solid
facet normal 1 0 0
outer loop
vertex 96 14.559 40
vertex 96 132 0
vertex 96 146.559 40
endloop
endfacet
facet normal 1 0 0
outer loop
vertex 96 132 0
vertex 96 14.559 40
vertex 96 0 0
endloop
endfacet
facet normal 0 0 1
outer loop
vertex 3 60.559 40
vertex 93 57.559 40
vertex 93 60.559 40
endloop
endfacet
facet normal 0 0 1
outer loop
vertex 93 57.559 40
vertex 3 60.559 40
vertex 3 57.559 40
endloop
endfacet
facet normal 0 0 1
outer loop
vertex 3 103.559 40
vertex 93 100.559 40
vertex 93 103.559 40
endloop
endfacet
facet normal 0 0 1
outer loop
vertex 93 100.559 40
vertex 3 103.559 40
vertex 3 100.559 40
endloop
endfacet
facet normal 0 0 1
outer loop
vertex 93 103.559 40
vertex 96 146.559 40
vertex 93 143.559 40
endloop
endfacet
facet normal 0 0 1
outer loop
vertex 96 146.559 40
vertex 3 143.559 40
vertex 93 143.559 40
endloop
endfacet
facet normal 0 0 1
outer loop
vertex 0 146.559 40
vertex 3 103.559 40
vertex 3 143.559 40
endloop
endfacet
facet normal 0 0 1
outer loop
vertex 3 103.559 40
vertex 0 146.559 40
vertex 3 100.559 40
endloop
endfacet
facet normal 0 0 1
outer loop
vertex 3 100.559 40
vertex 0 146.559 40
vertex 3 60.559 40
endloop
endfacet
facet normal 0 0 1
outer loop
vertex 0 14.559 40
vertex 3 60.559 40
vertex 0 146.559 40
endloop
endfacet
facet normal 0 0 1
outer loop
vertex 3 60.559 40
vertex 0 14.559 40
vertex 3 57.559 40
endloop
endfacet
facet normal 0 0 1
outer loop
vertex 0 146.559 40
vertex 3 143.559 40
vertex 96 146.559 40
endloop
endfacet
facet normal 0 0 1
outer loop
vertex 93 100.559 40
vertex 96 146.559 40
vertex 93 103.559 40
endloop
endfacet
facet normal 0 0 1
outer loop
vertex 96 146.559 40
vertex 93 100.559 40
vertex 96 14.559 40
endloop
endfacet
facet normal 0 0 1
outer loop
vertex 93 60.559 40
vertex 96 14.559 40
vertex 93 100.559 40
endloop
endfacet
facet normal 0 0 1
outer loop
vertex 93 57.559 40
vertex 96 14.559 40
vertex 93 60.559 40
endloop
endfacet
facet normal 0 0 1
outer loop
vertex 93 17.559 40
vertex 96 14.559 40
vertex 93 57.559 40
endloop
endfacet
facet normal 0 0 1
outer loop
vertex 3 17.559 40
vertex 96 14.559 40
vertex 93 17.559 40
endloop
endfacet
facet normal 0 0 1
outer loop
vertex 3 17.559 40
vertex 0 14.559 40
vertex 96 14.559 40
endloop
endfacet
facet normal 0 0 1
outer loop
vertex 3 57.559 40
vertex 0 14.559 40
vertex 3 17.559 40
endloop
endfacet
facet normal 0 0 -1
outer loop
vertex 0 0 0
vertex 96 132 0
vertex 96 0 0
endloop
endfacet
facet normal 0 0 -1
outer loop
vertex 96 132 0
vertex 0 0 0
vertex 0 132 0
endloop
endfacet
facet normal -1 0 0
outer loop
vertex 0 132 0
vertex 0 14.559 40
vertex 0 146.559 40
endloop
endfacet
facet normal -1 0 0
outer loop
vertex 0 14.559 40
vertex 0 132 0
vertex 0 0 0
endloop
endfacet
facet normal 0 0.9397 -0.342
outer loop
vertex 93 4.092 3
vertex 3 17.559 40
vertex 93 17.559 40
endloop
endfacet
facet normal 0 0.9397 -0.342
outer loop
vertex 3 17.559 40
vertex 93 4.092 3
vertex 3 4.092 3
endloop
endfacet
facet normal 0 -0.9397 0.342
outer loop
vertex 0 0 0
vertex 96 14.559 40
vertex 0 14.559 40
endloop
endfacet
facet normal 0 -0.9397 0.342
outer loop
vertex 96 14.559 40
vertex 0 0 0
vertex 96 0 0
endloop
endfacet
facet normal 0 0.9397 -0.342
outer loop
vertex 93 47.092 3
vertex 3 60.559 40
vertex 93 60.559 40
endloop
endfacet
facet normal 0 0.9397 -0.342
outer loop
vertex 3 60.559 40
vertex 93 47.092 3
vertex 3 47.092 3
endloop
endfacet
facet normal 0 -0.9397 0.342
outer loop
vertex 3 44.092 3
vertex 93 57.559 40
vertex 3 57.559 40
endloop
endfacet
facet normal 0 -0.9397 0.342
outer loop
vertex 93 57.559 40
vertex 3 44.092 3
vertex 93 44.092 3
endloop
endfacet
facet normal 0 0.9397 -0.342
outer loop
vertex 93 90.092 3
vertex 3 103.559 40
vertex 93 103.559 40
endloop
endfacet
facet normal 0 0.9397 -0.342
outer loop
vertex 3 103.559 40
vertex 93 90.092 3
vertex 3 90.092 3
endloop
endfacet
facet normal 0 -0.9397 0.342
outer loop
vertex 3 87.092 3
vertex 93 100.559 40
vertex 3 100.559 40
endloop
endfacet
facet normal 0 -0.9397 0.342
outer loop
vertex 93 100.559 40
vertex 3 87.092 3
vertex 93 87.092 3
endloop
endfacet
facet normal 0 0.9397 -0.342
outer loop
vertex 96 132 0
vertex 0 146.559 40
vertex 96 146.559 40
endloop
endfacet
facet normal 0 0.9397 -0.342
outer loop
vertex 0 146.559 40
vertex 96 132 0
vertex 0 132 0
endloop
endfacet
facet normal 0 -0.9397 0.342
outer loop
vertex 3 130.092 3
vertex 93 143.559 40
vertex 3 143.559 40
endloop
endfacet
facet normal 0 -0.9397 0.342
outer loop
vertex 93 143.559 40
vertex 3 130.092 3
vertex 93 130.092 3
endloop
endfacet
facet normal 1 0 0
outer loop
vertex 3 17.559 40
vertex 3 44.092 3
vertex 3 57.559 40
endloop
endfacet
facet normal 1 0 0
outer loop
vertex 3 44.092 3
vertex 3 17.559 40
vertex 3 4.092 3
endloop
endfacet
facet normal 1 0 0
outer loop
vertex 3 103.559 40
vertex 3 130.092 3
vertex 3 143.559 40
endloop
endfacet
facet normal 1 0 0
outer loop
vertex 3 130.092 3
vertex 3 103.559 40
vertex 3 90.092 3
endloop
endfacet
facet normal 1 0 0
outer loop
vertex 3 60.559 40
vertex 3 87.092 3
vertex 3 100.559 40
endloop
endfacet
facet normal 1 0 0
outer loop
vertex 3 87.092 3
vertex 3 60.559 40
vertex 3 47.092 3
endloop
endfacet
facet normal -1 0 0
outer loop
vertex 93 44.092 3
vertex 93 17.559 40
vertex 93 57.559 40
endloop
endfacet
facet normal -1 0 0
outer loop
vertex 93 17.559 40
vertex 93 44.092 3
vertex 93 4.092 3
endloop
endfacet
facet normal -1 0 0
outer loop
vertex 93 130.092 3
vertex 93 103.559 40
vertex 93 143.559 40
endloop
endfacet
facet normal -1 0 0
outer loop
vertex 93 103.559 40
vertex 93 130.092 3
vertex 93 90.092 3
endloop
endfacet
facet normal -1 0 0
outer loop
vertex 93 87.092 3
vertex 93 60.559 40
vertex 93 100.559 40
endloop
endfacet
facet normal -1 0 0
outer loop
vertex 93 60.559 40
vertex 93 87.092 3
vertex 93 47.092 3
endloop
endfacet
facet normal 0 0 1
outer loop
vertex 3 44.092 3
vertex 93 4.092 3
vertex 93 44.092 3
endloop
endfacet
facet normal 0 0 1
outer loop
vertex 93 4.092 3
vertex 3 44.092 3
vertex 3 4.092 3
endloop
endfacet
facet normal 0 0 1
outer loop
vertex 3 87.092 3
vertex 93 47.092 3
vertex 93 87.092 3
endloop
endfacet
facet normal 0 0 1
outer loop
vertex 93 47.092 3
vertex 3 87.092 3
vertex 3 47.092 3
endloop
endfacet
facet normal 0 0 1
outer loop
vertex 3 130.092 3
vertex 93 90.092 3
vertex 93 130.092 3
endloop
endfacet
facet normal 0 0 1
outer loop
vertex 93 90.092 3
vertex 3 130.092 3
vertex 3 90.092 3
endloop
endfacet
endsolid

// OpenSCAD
module card_organizer(
    n_modules, module_length, height, width, thickness, angle
    ){
        
multmatrix(
m = [
        [1, 0,0,0],
        [0,1,tan(angle),0],
        [0,0,1,0],
        [0,0,0,1]
    ])
    {
        whole_length = (module_length+thickness)*n_modules+thickness;
        for(i = [0: module_length+thickness : whole_length])
            translate([0,i,0])
                cube([width+ 2*thickness, thickness, height]);
        cube([width+ 2*thickness, whole_length, thickness]);
        for(i = [0, width+thickness])
            translate([i, 0,0])
                cube([thickness, whole_length, height]);
    }
}

angle=75;
card_organizer(3, 40, 40, 90, 3, 20);
